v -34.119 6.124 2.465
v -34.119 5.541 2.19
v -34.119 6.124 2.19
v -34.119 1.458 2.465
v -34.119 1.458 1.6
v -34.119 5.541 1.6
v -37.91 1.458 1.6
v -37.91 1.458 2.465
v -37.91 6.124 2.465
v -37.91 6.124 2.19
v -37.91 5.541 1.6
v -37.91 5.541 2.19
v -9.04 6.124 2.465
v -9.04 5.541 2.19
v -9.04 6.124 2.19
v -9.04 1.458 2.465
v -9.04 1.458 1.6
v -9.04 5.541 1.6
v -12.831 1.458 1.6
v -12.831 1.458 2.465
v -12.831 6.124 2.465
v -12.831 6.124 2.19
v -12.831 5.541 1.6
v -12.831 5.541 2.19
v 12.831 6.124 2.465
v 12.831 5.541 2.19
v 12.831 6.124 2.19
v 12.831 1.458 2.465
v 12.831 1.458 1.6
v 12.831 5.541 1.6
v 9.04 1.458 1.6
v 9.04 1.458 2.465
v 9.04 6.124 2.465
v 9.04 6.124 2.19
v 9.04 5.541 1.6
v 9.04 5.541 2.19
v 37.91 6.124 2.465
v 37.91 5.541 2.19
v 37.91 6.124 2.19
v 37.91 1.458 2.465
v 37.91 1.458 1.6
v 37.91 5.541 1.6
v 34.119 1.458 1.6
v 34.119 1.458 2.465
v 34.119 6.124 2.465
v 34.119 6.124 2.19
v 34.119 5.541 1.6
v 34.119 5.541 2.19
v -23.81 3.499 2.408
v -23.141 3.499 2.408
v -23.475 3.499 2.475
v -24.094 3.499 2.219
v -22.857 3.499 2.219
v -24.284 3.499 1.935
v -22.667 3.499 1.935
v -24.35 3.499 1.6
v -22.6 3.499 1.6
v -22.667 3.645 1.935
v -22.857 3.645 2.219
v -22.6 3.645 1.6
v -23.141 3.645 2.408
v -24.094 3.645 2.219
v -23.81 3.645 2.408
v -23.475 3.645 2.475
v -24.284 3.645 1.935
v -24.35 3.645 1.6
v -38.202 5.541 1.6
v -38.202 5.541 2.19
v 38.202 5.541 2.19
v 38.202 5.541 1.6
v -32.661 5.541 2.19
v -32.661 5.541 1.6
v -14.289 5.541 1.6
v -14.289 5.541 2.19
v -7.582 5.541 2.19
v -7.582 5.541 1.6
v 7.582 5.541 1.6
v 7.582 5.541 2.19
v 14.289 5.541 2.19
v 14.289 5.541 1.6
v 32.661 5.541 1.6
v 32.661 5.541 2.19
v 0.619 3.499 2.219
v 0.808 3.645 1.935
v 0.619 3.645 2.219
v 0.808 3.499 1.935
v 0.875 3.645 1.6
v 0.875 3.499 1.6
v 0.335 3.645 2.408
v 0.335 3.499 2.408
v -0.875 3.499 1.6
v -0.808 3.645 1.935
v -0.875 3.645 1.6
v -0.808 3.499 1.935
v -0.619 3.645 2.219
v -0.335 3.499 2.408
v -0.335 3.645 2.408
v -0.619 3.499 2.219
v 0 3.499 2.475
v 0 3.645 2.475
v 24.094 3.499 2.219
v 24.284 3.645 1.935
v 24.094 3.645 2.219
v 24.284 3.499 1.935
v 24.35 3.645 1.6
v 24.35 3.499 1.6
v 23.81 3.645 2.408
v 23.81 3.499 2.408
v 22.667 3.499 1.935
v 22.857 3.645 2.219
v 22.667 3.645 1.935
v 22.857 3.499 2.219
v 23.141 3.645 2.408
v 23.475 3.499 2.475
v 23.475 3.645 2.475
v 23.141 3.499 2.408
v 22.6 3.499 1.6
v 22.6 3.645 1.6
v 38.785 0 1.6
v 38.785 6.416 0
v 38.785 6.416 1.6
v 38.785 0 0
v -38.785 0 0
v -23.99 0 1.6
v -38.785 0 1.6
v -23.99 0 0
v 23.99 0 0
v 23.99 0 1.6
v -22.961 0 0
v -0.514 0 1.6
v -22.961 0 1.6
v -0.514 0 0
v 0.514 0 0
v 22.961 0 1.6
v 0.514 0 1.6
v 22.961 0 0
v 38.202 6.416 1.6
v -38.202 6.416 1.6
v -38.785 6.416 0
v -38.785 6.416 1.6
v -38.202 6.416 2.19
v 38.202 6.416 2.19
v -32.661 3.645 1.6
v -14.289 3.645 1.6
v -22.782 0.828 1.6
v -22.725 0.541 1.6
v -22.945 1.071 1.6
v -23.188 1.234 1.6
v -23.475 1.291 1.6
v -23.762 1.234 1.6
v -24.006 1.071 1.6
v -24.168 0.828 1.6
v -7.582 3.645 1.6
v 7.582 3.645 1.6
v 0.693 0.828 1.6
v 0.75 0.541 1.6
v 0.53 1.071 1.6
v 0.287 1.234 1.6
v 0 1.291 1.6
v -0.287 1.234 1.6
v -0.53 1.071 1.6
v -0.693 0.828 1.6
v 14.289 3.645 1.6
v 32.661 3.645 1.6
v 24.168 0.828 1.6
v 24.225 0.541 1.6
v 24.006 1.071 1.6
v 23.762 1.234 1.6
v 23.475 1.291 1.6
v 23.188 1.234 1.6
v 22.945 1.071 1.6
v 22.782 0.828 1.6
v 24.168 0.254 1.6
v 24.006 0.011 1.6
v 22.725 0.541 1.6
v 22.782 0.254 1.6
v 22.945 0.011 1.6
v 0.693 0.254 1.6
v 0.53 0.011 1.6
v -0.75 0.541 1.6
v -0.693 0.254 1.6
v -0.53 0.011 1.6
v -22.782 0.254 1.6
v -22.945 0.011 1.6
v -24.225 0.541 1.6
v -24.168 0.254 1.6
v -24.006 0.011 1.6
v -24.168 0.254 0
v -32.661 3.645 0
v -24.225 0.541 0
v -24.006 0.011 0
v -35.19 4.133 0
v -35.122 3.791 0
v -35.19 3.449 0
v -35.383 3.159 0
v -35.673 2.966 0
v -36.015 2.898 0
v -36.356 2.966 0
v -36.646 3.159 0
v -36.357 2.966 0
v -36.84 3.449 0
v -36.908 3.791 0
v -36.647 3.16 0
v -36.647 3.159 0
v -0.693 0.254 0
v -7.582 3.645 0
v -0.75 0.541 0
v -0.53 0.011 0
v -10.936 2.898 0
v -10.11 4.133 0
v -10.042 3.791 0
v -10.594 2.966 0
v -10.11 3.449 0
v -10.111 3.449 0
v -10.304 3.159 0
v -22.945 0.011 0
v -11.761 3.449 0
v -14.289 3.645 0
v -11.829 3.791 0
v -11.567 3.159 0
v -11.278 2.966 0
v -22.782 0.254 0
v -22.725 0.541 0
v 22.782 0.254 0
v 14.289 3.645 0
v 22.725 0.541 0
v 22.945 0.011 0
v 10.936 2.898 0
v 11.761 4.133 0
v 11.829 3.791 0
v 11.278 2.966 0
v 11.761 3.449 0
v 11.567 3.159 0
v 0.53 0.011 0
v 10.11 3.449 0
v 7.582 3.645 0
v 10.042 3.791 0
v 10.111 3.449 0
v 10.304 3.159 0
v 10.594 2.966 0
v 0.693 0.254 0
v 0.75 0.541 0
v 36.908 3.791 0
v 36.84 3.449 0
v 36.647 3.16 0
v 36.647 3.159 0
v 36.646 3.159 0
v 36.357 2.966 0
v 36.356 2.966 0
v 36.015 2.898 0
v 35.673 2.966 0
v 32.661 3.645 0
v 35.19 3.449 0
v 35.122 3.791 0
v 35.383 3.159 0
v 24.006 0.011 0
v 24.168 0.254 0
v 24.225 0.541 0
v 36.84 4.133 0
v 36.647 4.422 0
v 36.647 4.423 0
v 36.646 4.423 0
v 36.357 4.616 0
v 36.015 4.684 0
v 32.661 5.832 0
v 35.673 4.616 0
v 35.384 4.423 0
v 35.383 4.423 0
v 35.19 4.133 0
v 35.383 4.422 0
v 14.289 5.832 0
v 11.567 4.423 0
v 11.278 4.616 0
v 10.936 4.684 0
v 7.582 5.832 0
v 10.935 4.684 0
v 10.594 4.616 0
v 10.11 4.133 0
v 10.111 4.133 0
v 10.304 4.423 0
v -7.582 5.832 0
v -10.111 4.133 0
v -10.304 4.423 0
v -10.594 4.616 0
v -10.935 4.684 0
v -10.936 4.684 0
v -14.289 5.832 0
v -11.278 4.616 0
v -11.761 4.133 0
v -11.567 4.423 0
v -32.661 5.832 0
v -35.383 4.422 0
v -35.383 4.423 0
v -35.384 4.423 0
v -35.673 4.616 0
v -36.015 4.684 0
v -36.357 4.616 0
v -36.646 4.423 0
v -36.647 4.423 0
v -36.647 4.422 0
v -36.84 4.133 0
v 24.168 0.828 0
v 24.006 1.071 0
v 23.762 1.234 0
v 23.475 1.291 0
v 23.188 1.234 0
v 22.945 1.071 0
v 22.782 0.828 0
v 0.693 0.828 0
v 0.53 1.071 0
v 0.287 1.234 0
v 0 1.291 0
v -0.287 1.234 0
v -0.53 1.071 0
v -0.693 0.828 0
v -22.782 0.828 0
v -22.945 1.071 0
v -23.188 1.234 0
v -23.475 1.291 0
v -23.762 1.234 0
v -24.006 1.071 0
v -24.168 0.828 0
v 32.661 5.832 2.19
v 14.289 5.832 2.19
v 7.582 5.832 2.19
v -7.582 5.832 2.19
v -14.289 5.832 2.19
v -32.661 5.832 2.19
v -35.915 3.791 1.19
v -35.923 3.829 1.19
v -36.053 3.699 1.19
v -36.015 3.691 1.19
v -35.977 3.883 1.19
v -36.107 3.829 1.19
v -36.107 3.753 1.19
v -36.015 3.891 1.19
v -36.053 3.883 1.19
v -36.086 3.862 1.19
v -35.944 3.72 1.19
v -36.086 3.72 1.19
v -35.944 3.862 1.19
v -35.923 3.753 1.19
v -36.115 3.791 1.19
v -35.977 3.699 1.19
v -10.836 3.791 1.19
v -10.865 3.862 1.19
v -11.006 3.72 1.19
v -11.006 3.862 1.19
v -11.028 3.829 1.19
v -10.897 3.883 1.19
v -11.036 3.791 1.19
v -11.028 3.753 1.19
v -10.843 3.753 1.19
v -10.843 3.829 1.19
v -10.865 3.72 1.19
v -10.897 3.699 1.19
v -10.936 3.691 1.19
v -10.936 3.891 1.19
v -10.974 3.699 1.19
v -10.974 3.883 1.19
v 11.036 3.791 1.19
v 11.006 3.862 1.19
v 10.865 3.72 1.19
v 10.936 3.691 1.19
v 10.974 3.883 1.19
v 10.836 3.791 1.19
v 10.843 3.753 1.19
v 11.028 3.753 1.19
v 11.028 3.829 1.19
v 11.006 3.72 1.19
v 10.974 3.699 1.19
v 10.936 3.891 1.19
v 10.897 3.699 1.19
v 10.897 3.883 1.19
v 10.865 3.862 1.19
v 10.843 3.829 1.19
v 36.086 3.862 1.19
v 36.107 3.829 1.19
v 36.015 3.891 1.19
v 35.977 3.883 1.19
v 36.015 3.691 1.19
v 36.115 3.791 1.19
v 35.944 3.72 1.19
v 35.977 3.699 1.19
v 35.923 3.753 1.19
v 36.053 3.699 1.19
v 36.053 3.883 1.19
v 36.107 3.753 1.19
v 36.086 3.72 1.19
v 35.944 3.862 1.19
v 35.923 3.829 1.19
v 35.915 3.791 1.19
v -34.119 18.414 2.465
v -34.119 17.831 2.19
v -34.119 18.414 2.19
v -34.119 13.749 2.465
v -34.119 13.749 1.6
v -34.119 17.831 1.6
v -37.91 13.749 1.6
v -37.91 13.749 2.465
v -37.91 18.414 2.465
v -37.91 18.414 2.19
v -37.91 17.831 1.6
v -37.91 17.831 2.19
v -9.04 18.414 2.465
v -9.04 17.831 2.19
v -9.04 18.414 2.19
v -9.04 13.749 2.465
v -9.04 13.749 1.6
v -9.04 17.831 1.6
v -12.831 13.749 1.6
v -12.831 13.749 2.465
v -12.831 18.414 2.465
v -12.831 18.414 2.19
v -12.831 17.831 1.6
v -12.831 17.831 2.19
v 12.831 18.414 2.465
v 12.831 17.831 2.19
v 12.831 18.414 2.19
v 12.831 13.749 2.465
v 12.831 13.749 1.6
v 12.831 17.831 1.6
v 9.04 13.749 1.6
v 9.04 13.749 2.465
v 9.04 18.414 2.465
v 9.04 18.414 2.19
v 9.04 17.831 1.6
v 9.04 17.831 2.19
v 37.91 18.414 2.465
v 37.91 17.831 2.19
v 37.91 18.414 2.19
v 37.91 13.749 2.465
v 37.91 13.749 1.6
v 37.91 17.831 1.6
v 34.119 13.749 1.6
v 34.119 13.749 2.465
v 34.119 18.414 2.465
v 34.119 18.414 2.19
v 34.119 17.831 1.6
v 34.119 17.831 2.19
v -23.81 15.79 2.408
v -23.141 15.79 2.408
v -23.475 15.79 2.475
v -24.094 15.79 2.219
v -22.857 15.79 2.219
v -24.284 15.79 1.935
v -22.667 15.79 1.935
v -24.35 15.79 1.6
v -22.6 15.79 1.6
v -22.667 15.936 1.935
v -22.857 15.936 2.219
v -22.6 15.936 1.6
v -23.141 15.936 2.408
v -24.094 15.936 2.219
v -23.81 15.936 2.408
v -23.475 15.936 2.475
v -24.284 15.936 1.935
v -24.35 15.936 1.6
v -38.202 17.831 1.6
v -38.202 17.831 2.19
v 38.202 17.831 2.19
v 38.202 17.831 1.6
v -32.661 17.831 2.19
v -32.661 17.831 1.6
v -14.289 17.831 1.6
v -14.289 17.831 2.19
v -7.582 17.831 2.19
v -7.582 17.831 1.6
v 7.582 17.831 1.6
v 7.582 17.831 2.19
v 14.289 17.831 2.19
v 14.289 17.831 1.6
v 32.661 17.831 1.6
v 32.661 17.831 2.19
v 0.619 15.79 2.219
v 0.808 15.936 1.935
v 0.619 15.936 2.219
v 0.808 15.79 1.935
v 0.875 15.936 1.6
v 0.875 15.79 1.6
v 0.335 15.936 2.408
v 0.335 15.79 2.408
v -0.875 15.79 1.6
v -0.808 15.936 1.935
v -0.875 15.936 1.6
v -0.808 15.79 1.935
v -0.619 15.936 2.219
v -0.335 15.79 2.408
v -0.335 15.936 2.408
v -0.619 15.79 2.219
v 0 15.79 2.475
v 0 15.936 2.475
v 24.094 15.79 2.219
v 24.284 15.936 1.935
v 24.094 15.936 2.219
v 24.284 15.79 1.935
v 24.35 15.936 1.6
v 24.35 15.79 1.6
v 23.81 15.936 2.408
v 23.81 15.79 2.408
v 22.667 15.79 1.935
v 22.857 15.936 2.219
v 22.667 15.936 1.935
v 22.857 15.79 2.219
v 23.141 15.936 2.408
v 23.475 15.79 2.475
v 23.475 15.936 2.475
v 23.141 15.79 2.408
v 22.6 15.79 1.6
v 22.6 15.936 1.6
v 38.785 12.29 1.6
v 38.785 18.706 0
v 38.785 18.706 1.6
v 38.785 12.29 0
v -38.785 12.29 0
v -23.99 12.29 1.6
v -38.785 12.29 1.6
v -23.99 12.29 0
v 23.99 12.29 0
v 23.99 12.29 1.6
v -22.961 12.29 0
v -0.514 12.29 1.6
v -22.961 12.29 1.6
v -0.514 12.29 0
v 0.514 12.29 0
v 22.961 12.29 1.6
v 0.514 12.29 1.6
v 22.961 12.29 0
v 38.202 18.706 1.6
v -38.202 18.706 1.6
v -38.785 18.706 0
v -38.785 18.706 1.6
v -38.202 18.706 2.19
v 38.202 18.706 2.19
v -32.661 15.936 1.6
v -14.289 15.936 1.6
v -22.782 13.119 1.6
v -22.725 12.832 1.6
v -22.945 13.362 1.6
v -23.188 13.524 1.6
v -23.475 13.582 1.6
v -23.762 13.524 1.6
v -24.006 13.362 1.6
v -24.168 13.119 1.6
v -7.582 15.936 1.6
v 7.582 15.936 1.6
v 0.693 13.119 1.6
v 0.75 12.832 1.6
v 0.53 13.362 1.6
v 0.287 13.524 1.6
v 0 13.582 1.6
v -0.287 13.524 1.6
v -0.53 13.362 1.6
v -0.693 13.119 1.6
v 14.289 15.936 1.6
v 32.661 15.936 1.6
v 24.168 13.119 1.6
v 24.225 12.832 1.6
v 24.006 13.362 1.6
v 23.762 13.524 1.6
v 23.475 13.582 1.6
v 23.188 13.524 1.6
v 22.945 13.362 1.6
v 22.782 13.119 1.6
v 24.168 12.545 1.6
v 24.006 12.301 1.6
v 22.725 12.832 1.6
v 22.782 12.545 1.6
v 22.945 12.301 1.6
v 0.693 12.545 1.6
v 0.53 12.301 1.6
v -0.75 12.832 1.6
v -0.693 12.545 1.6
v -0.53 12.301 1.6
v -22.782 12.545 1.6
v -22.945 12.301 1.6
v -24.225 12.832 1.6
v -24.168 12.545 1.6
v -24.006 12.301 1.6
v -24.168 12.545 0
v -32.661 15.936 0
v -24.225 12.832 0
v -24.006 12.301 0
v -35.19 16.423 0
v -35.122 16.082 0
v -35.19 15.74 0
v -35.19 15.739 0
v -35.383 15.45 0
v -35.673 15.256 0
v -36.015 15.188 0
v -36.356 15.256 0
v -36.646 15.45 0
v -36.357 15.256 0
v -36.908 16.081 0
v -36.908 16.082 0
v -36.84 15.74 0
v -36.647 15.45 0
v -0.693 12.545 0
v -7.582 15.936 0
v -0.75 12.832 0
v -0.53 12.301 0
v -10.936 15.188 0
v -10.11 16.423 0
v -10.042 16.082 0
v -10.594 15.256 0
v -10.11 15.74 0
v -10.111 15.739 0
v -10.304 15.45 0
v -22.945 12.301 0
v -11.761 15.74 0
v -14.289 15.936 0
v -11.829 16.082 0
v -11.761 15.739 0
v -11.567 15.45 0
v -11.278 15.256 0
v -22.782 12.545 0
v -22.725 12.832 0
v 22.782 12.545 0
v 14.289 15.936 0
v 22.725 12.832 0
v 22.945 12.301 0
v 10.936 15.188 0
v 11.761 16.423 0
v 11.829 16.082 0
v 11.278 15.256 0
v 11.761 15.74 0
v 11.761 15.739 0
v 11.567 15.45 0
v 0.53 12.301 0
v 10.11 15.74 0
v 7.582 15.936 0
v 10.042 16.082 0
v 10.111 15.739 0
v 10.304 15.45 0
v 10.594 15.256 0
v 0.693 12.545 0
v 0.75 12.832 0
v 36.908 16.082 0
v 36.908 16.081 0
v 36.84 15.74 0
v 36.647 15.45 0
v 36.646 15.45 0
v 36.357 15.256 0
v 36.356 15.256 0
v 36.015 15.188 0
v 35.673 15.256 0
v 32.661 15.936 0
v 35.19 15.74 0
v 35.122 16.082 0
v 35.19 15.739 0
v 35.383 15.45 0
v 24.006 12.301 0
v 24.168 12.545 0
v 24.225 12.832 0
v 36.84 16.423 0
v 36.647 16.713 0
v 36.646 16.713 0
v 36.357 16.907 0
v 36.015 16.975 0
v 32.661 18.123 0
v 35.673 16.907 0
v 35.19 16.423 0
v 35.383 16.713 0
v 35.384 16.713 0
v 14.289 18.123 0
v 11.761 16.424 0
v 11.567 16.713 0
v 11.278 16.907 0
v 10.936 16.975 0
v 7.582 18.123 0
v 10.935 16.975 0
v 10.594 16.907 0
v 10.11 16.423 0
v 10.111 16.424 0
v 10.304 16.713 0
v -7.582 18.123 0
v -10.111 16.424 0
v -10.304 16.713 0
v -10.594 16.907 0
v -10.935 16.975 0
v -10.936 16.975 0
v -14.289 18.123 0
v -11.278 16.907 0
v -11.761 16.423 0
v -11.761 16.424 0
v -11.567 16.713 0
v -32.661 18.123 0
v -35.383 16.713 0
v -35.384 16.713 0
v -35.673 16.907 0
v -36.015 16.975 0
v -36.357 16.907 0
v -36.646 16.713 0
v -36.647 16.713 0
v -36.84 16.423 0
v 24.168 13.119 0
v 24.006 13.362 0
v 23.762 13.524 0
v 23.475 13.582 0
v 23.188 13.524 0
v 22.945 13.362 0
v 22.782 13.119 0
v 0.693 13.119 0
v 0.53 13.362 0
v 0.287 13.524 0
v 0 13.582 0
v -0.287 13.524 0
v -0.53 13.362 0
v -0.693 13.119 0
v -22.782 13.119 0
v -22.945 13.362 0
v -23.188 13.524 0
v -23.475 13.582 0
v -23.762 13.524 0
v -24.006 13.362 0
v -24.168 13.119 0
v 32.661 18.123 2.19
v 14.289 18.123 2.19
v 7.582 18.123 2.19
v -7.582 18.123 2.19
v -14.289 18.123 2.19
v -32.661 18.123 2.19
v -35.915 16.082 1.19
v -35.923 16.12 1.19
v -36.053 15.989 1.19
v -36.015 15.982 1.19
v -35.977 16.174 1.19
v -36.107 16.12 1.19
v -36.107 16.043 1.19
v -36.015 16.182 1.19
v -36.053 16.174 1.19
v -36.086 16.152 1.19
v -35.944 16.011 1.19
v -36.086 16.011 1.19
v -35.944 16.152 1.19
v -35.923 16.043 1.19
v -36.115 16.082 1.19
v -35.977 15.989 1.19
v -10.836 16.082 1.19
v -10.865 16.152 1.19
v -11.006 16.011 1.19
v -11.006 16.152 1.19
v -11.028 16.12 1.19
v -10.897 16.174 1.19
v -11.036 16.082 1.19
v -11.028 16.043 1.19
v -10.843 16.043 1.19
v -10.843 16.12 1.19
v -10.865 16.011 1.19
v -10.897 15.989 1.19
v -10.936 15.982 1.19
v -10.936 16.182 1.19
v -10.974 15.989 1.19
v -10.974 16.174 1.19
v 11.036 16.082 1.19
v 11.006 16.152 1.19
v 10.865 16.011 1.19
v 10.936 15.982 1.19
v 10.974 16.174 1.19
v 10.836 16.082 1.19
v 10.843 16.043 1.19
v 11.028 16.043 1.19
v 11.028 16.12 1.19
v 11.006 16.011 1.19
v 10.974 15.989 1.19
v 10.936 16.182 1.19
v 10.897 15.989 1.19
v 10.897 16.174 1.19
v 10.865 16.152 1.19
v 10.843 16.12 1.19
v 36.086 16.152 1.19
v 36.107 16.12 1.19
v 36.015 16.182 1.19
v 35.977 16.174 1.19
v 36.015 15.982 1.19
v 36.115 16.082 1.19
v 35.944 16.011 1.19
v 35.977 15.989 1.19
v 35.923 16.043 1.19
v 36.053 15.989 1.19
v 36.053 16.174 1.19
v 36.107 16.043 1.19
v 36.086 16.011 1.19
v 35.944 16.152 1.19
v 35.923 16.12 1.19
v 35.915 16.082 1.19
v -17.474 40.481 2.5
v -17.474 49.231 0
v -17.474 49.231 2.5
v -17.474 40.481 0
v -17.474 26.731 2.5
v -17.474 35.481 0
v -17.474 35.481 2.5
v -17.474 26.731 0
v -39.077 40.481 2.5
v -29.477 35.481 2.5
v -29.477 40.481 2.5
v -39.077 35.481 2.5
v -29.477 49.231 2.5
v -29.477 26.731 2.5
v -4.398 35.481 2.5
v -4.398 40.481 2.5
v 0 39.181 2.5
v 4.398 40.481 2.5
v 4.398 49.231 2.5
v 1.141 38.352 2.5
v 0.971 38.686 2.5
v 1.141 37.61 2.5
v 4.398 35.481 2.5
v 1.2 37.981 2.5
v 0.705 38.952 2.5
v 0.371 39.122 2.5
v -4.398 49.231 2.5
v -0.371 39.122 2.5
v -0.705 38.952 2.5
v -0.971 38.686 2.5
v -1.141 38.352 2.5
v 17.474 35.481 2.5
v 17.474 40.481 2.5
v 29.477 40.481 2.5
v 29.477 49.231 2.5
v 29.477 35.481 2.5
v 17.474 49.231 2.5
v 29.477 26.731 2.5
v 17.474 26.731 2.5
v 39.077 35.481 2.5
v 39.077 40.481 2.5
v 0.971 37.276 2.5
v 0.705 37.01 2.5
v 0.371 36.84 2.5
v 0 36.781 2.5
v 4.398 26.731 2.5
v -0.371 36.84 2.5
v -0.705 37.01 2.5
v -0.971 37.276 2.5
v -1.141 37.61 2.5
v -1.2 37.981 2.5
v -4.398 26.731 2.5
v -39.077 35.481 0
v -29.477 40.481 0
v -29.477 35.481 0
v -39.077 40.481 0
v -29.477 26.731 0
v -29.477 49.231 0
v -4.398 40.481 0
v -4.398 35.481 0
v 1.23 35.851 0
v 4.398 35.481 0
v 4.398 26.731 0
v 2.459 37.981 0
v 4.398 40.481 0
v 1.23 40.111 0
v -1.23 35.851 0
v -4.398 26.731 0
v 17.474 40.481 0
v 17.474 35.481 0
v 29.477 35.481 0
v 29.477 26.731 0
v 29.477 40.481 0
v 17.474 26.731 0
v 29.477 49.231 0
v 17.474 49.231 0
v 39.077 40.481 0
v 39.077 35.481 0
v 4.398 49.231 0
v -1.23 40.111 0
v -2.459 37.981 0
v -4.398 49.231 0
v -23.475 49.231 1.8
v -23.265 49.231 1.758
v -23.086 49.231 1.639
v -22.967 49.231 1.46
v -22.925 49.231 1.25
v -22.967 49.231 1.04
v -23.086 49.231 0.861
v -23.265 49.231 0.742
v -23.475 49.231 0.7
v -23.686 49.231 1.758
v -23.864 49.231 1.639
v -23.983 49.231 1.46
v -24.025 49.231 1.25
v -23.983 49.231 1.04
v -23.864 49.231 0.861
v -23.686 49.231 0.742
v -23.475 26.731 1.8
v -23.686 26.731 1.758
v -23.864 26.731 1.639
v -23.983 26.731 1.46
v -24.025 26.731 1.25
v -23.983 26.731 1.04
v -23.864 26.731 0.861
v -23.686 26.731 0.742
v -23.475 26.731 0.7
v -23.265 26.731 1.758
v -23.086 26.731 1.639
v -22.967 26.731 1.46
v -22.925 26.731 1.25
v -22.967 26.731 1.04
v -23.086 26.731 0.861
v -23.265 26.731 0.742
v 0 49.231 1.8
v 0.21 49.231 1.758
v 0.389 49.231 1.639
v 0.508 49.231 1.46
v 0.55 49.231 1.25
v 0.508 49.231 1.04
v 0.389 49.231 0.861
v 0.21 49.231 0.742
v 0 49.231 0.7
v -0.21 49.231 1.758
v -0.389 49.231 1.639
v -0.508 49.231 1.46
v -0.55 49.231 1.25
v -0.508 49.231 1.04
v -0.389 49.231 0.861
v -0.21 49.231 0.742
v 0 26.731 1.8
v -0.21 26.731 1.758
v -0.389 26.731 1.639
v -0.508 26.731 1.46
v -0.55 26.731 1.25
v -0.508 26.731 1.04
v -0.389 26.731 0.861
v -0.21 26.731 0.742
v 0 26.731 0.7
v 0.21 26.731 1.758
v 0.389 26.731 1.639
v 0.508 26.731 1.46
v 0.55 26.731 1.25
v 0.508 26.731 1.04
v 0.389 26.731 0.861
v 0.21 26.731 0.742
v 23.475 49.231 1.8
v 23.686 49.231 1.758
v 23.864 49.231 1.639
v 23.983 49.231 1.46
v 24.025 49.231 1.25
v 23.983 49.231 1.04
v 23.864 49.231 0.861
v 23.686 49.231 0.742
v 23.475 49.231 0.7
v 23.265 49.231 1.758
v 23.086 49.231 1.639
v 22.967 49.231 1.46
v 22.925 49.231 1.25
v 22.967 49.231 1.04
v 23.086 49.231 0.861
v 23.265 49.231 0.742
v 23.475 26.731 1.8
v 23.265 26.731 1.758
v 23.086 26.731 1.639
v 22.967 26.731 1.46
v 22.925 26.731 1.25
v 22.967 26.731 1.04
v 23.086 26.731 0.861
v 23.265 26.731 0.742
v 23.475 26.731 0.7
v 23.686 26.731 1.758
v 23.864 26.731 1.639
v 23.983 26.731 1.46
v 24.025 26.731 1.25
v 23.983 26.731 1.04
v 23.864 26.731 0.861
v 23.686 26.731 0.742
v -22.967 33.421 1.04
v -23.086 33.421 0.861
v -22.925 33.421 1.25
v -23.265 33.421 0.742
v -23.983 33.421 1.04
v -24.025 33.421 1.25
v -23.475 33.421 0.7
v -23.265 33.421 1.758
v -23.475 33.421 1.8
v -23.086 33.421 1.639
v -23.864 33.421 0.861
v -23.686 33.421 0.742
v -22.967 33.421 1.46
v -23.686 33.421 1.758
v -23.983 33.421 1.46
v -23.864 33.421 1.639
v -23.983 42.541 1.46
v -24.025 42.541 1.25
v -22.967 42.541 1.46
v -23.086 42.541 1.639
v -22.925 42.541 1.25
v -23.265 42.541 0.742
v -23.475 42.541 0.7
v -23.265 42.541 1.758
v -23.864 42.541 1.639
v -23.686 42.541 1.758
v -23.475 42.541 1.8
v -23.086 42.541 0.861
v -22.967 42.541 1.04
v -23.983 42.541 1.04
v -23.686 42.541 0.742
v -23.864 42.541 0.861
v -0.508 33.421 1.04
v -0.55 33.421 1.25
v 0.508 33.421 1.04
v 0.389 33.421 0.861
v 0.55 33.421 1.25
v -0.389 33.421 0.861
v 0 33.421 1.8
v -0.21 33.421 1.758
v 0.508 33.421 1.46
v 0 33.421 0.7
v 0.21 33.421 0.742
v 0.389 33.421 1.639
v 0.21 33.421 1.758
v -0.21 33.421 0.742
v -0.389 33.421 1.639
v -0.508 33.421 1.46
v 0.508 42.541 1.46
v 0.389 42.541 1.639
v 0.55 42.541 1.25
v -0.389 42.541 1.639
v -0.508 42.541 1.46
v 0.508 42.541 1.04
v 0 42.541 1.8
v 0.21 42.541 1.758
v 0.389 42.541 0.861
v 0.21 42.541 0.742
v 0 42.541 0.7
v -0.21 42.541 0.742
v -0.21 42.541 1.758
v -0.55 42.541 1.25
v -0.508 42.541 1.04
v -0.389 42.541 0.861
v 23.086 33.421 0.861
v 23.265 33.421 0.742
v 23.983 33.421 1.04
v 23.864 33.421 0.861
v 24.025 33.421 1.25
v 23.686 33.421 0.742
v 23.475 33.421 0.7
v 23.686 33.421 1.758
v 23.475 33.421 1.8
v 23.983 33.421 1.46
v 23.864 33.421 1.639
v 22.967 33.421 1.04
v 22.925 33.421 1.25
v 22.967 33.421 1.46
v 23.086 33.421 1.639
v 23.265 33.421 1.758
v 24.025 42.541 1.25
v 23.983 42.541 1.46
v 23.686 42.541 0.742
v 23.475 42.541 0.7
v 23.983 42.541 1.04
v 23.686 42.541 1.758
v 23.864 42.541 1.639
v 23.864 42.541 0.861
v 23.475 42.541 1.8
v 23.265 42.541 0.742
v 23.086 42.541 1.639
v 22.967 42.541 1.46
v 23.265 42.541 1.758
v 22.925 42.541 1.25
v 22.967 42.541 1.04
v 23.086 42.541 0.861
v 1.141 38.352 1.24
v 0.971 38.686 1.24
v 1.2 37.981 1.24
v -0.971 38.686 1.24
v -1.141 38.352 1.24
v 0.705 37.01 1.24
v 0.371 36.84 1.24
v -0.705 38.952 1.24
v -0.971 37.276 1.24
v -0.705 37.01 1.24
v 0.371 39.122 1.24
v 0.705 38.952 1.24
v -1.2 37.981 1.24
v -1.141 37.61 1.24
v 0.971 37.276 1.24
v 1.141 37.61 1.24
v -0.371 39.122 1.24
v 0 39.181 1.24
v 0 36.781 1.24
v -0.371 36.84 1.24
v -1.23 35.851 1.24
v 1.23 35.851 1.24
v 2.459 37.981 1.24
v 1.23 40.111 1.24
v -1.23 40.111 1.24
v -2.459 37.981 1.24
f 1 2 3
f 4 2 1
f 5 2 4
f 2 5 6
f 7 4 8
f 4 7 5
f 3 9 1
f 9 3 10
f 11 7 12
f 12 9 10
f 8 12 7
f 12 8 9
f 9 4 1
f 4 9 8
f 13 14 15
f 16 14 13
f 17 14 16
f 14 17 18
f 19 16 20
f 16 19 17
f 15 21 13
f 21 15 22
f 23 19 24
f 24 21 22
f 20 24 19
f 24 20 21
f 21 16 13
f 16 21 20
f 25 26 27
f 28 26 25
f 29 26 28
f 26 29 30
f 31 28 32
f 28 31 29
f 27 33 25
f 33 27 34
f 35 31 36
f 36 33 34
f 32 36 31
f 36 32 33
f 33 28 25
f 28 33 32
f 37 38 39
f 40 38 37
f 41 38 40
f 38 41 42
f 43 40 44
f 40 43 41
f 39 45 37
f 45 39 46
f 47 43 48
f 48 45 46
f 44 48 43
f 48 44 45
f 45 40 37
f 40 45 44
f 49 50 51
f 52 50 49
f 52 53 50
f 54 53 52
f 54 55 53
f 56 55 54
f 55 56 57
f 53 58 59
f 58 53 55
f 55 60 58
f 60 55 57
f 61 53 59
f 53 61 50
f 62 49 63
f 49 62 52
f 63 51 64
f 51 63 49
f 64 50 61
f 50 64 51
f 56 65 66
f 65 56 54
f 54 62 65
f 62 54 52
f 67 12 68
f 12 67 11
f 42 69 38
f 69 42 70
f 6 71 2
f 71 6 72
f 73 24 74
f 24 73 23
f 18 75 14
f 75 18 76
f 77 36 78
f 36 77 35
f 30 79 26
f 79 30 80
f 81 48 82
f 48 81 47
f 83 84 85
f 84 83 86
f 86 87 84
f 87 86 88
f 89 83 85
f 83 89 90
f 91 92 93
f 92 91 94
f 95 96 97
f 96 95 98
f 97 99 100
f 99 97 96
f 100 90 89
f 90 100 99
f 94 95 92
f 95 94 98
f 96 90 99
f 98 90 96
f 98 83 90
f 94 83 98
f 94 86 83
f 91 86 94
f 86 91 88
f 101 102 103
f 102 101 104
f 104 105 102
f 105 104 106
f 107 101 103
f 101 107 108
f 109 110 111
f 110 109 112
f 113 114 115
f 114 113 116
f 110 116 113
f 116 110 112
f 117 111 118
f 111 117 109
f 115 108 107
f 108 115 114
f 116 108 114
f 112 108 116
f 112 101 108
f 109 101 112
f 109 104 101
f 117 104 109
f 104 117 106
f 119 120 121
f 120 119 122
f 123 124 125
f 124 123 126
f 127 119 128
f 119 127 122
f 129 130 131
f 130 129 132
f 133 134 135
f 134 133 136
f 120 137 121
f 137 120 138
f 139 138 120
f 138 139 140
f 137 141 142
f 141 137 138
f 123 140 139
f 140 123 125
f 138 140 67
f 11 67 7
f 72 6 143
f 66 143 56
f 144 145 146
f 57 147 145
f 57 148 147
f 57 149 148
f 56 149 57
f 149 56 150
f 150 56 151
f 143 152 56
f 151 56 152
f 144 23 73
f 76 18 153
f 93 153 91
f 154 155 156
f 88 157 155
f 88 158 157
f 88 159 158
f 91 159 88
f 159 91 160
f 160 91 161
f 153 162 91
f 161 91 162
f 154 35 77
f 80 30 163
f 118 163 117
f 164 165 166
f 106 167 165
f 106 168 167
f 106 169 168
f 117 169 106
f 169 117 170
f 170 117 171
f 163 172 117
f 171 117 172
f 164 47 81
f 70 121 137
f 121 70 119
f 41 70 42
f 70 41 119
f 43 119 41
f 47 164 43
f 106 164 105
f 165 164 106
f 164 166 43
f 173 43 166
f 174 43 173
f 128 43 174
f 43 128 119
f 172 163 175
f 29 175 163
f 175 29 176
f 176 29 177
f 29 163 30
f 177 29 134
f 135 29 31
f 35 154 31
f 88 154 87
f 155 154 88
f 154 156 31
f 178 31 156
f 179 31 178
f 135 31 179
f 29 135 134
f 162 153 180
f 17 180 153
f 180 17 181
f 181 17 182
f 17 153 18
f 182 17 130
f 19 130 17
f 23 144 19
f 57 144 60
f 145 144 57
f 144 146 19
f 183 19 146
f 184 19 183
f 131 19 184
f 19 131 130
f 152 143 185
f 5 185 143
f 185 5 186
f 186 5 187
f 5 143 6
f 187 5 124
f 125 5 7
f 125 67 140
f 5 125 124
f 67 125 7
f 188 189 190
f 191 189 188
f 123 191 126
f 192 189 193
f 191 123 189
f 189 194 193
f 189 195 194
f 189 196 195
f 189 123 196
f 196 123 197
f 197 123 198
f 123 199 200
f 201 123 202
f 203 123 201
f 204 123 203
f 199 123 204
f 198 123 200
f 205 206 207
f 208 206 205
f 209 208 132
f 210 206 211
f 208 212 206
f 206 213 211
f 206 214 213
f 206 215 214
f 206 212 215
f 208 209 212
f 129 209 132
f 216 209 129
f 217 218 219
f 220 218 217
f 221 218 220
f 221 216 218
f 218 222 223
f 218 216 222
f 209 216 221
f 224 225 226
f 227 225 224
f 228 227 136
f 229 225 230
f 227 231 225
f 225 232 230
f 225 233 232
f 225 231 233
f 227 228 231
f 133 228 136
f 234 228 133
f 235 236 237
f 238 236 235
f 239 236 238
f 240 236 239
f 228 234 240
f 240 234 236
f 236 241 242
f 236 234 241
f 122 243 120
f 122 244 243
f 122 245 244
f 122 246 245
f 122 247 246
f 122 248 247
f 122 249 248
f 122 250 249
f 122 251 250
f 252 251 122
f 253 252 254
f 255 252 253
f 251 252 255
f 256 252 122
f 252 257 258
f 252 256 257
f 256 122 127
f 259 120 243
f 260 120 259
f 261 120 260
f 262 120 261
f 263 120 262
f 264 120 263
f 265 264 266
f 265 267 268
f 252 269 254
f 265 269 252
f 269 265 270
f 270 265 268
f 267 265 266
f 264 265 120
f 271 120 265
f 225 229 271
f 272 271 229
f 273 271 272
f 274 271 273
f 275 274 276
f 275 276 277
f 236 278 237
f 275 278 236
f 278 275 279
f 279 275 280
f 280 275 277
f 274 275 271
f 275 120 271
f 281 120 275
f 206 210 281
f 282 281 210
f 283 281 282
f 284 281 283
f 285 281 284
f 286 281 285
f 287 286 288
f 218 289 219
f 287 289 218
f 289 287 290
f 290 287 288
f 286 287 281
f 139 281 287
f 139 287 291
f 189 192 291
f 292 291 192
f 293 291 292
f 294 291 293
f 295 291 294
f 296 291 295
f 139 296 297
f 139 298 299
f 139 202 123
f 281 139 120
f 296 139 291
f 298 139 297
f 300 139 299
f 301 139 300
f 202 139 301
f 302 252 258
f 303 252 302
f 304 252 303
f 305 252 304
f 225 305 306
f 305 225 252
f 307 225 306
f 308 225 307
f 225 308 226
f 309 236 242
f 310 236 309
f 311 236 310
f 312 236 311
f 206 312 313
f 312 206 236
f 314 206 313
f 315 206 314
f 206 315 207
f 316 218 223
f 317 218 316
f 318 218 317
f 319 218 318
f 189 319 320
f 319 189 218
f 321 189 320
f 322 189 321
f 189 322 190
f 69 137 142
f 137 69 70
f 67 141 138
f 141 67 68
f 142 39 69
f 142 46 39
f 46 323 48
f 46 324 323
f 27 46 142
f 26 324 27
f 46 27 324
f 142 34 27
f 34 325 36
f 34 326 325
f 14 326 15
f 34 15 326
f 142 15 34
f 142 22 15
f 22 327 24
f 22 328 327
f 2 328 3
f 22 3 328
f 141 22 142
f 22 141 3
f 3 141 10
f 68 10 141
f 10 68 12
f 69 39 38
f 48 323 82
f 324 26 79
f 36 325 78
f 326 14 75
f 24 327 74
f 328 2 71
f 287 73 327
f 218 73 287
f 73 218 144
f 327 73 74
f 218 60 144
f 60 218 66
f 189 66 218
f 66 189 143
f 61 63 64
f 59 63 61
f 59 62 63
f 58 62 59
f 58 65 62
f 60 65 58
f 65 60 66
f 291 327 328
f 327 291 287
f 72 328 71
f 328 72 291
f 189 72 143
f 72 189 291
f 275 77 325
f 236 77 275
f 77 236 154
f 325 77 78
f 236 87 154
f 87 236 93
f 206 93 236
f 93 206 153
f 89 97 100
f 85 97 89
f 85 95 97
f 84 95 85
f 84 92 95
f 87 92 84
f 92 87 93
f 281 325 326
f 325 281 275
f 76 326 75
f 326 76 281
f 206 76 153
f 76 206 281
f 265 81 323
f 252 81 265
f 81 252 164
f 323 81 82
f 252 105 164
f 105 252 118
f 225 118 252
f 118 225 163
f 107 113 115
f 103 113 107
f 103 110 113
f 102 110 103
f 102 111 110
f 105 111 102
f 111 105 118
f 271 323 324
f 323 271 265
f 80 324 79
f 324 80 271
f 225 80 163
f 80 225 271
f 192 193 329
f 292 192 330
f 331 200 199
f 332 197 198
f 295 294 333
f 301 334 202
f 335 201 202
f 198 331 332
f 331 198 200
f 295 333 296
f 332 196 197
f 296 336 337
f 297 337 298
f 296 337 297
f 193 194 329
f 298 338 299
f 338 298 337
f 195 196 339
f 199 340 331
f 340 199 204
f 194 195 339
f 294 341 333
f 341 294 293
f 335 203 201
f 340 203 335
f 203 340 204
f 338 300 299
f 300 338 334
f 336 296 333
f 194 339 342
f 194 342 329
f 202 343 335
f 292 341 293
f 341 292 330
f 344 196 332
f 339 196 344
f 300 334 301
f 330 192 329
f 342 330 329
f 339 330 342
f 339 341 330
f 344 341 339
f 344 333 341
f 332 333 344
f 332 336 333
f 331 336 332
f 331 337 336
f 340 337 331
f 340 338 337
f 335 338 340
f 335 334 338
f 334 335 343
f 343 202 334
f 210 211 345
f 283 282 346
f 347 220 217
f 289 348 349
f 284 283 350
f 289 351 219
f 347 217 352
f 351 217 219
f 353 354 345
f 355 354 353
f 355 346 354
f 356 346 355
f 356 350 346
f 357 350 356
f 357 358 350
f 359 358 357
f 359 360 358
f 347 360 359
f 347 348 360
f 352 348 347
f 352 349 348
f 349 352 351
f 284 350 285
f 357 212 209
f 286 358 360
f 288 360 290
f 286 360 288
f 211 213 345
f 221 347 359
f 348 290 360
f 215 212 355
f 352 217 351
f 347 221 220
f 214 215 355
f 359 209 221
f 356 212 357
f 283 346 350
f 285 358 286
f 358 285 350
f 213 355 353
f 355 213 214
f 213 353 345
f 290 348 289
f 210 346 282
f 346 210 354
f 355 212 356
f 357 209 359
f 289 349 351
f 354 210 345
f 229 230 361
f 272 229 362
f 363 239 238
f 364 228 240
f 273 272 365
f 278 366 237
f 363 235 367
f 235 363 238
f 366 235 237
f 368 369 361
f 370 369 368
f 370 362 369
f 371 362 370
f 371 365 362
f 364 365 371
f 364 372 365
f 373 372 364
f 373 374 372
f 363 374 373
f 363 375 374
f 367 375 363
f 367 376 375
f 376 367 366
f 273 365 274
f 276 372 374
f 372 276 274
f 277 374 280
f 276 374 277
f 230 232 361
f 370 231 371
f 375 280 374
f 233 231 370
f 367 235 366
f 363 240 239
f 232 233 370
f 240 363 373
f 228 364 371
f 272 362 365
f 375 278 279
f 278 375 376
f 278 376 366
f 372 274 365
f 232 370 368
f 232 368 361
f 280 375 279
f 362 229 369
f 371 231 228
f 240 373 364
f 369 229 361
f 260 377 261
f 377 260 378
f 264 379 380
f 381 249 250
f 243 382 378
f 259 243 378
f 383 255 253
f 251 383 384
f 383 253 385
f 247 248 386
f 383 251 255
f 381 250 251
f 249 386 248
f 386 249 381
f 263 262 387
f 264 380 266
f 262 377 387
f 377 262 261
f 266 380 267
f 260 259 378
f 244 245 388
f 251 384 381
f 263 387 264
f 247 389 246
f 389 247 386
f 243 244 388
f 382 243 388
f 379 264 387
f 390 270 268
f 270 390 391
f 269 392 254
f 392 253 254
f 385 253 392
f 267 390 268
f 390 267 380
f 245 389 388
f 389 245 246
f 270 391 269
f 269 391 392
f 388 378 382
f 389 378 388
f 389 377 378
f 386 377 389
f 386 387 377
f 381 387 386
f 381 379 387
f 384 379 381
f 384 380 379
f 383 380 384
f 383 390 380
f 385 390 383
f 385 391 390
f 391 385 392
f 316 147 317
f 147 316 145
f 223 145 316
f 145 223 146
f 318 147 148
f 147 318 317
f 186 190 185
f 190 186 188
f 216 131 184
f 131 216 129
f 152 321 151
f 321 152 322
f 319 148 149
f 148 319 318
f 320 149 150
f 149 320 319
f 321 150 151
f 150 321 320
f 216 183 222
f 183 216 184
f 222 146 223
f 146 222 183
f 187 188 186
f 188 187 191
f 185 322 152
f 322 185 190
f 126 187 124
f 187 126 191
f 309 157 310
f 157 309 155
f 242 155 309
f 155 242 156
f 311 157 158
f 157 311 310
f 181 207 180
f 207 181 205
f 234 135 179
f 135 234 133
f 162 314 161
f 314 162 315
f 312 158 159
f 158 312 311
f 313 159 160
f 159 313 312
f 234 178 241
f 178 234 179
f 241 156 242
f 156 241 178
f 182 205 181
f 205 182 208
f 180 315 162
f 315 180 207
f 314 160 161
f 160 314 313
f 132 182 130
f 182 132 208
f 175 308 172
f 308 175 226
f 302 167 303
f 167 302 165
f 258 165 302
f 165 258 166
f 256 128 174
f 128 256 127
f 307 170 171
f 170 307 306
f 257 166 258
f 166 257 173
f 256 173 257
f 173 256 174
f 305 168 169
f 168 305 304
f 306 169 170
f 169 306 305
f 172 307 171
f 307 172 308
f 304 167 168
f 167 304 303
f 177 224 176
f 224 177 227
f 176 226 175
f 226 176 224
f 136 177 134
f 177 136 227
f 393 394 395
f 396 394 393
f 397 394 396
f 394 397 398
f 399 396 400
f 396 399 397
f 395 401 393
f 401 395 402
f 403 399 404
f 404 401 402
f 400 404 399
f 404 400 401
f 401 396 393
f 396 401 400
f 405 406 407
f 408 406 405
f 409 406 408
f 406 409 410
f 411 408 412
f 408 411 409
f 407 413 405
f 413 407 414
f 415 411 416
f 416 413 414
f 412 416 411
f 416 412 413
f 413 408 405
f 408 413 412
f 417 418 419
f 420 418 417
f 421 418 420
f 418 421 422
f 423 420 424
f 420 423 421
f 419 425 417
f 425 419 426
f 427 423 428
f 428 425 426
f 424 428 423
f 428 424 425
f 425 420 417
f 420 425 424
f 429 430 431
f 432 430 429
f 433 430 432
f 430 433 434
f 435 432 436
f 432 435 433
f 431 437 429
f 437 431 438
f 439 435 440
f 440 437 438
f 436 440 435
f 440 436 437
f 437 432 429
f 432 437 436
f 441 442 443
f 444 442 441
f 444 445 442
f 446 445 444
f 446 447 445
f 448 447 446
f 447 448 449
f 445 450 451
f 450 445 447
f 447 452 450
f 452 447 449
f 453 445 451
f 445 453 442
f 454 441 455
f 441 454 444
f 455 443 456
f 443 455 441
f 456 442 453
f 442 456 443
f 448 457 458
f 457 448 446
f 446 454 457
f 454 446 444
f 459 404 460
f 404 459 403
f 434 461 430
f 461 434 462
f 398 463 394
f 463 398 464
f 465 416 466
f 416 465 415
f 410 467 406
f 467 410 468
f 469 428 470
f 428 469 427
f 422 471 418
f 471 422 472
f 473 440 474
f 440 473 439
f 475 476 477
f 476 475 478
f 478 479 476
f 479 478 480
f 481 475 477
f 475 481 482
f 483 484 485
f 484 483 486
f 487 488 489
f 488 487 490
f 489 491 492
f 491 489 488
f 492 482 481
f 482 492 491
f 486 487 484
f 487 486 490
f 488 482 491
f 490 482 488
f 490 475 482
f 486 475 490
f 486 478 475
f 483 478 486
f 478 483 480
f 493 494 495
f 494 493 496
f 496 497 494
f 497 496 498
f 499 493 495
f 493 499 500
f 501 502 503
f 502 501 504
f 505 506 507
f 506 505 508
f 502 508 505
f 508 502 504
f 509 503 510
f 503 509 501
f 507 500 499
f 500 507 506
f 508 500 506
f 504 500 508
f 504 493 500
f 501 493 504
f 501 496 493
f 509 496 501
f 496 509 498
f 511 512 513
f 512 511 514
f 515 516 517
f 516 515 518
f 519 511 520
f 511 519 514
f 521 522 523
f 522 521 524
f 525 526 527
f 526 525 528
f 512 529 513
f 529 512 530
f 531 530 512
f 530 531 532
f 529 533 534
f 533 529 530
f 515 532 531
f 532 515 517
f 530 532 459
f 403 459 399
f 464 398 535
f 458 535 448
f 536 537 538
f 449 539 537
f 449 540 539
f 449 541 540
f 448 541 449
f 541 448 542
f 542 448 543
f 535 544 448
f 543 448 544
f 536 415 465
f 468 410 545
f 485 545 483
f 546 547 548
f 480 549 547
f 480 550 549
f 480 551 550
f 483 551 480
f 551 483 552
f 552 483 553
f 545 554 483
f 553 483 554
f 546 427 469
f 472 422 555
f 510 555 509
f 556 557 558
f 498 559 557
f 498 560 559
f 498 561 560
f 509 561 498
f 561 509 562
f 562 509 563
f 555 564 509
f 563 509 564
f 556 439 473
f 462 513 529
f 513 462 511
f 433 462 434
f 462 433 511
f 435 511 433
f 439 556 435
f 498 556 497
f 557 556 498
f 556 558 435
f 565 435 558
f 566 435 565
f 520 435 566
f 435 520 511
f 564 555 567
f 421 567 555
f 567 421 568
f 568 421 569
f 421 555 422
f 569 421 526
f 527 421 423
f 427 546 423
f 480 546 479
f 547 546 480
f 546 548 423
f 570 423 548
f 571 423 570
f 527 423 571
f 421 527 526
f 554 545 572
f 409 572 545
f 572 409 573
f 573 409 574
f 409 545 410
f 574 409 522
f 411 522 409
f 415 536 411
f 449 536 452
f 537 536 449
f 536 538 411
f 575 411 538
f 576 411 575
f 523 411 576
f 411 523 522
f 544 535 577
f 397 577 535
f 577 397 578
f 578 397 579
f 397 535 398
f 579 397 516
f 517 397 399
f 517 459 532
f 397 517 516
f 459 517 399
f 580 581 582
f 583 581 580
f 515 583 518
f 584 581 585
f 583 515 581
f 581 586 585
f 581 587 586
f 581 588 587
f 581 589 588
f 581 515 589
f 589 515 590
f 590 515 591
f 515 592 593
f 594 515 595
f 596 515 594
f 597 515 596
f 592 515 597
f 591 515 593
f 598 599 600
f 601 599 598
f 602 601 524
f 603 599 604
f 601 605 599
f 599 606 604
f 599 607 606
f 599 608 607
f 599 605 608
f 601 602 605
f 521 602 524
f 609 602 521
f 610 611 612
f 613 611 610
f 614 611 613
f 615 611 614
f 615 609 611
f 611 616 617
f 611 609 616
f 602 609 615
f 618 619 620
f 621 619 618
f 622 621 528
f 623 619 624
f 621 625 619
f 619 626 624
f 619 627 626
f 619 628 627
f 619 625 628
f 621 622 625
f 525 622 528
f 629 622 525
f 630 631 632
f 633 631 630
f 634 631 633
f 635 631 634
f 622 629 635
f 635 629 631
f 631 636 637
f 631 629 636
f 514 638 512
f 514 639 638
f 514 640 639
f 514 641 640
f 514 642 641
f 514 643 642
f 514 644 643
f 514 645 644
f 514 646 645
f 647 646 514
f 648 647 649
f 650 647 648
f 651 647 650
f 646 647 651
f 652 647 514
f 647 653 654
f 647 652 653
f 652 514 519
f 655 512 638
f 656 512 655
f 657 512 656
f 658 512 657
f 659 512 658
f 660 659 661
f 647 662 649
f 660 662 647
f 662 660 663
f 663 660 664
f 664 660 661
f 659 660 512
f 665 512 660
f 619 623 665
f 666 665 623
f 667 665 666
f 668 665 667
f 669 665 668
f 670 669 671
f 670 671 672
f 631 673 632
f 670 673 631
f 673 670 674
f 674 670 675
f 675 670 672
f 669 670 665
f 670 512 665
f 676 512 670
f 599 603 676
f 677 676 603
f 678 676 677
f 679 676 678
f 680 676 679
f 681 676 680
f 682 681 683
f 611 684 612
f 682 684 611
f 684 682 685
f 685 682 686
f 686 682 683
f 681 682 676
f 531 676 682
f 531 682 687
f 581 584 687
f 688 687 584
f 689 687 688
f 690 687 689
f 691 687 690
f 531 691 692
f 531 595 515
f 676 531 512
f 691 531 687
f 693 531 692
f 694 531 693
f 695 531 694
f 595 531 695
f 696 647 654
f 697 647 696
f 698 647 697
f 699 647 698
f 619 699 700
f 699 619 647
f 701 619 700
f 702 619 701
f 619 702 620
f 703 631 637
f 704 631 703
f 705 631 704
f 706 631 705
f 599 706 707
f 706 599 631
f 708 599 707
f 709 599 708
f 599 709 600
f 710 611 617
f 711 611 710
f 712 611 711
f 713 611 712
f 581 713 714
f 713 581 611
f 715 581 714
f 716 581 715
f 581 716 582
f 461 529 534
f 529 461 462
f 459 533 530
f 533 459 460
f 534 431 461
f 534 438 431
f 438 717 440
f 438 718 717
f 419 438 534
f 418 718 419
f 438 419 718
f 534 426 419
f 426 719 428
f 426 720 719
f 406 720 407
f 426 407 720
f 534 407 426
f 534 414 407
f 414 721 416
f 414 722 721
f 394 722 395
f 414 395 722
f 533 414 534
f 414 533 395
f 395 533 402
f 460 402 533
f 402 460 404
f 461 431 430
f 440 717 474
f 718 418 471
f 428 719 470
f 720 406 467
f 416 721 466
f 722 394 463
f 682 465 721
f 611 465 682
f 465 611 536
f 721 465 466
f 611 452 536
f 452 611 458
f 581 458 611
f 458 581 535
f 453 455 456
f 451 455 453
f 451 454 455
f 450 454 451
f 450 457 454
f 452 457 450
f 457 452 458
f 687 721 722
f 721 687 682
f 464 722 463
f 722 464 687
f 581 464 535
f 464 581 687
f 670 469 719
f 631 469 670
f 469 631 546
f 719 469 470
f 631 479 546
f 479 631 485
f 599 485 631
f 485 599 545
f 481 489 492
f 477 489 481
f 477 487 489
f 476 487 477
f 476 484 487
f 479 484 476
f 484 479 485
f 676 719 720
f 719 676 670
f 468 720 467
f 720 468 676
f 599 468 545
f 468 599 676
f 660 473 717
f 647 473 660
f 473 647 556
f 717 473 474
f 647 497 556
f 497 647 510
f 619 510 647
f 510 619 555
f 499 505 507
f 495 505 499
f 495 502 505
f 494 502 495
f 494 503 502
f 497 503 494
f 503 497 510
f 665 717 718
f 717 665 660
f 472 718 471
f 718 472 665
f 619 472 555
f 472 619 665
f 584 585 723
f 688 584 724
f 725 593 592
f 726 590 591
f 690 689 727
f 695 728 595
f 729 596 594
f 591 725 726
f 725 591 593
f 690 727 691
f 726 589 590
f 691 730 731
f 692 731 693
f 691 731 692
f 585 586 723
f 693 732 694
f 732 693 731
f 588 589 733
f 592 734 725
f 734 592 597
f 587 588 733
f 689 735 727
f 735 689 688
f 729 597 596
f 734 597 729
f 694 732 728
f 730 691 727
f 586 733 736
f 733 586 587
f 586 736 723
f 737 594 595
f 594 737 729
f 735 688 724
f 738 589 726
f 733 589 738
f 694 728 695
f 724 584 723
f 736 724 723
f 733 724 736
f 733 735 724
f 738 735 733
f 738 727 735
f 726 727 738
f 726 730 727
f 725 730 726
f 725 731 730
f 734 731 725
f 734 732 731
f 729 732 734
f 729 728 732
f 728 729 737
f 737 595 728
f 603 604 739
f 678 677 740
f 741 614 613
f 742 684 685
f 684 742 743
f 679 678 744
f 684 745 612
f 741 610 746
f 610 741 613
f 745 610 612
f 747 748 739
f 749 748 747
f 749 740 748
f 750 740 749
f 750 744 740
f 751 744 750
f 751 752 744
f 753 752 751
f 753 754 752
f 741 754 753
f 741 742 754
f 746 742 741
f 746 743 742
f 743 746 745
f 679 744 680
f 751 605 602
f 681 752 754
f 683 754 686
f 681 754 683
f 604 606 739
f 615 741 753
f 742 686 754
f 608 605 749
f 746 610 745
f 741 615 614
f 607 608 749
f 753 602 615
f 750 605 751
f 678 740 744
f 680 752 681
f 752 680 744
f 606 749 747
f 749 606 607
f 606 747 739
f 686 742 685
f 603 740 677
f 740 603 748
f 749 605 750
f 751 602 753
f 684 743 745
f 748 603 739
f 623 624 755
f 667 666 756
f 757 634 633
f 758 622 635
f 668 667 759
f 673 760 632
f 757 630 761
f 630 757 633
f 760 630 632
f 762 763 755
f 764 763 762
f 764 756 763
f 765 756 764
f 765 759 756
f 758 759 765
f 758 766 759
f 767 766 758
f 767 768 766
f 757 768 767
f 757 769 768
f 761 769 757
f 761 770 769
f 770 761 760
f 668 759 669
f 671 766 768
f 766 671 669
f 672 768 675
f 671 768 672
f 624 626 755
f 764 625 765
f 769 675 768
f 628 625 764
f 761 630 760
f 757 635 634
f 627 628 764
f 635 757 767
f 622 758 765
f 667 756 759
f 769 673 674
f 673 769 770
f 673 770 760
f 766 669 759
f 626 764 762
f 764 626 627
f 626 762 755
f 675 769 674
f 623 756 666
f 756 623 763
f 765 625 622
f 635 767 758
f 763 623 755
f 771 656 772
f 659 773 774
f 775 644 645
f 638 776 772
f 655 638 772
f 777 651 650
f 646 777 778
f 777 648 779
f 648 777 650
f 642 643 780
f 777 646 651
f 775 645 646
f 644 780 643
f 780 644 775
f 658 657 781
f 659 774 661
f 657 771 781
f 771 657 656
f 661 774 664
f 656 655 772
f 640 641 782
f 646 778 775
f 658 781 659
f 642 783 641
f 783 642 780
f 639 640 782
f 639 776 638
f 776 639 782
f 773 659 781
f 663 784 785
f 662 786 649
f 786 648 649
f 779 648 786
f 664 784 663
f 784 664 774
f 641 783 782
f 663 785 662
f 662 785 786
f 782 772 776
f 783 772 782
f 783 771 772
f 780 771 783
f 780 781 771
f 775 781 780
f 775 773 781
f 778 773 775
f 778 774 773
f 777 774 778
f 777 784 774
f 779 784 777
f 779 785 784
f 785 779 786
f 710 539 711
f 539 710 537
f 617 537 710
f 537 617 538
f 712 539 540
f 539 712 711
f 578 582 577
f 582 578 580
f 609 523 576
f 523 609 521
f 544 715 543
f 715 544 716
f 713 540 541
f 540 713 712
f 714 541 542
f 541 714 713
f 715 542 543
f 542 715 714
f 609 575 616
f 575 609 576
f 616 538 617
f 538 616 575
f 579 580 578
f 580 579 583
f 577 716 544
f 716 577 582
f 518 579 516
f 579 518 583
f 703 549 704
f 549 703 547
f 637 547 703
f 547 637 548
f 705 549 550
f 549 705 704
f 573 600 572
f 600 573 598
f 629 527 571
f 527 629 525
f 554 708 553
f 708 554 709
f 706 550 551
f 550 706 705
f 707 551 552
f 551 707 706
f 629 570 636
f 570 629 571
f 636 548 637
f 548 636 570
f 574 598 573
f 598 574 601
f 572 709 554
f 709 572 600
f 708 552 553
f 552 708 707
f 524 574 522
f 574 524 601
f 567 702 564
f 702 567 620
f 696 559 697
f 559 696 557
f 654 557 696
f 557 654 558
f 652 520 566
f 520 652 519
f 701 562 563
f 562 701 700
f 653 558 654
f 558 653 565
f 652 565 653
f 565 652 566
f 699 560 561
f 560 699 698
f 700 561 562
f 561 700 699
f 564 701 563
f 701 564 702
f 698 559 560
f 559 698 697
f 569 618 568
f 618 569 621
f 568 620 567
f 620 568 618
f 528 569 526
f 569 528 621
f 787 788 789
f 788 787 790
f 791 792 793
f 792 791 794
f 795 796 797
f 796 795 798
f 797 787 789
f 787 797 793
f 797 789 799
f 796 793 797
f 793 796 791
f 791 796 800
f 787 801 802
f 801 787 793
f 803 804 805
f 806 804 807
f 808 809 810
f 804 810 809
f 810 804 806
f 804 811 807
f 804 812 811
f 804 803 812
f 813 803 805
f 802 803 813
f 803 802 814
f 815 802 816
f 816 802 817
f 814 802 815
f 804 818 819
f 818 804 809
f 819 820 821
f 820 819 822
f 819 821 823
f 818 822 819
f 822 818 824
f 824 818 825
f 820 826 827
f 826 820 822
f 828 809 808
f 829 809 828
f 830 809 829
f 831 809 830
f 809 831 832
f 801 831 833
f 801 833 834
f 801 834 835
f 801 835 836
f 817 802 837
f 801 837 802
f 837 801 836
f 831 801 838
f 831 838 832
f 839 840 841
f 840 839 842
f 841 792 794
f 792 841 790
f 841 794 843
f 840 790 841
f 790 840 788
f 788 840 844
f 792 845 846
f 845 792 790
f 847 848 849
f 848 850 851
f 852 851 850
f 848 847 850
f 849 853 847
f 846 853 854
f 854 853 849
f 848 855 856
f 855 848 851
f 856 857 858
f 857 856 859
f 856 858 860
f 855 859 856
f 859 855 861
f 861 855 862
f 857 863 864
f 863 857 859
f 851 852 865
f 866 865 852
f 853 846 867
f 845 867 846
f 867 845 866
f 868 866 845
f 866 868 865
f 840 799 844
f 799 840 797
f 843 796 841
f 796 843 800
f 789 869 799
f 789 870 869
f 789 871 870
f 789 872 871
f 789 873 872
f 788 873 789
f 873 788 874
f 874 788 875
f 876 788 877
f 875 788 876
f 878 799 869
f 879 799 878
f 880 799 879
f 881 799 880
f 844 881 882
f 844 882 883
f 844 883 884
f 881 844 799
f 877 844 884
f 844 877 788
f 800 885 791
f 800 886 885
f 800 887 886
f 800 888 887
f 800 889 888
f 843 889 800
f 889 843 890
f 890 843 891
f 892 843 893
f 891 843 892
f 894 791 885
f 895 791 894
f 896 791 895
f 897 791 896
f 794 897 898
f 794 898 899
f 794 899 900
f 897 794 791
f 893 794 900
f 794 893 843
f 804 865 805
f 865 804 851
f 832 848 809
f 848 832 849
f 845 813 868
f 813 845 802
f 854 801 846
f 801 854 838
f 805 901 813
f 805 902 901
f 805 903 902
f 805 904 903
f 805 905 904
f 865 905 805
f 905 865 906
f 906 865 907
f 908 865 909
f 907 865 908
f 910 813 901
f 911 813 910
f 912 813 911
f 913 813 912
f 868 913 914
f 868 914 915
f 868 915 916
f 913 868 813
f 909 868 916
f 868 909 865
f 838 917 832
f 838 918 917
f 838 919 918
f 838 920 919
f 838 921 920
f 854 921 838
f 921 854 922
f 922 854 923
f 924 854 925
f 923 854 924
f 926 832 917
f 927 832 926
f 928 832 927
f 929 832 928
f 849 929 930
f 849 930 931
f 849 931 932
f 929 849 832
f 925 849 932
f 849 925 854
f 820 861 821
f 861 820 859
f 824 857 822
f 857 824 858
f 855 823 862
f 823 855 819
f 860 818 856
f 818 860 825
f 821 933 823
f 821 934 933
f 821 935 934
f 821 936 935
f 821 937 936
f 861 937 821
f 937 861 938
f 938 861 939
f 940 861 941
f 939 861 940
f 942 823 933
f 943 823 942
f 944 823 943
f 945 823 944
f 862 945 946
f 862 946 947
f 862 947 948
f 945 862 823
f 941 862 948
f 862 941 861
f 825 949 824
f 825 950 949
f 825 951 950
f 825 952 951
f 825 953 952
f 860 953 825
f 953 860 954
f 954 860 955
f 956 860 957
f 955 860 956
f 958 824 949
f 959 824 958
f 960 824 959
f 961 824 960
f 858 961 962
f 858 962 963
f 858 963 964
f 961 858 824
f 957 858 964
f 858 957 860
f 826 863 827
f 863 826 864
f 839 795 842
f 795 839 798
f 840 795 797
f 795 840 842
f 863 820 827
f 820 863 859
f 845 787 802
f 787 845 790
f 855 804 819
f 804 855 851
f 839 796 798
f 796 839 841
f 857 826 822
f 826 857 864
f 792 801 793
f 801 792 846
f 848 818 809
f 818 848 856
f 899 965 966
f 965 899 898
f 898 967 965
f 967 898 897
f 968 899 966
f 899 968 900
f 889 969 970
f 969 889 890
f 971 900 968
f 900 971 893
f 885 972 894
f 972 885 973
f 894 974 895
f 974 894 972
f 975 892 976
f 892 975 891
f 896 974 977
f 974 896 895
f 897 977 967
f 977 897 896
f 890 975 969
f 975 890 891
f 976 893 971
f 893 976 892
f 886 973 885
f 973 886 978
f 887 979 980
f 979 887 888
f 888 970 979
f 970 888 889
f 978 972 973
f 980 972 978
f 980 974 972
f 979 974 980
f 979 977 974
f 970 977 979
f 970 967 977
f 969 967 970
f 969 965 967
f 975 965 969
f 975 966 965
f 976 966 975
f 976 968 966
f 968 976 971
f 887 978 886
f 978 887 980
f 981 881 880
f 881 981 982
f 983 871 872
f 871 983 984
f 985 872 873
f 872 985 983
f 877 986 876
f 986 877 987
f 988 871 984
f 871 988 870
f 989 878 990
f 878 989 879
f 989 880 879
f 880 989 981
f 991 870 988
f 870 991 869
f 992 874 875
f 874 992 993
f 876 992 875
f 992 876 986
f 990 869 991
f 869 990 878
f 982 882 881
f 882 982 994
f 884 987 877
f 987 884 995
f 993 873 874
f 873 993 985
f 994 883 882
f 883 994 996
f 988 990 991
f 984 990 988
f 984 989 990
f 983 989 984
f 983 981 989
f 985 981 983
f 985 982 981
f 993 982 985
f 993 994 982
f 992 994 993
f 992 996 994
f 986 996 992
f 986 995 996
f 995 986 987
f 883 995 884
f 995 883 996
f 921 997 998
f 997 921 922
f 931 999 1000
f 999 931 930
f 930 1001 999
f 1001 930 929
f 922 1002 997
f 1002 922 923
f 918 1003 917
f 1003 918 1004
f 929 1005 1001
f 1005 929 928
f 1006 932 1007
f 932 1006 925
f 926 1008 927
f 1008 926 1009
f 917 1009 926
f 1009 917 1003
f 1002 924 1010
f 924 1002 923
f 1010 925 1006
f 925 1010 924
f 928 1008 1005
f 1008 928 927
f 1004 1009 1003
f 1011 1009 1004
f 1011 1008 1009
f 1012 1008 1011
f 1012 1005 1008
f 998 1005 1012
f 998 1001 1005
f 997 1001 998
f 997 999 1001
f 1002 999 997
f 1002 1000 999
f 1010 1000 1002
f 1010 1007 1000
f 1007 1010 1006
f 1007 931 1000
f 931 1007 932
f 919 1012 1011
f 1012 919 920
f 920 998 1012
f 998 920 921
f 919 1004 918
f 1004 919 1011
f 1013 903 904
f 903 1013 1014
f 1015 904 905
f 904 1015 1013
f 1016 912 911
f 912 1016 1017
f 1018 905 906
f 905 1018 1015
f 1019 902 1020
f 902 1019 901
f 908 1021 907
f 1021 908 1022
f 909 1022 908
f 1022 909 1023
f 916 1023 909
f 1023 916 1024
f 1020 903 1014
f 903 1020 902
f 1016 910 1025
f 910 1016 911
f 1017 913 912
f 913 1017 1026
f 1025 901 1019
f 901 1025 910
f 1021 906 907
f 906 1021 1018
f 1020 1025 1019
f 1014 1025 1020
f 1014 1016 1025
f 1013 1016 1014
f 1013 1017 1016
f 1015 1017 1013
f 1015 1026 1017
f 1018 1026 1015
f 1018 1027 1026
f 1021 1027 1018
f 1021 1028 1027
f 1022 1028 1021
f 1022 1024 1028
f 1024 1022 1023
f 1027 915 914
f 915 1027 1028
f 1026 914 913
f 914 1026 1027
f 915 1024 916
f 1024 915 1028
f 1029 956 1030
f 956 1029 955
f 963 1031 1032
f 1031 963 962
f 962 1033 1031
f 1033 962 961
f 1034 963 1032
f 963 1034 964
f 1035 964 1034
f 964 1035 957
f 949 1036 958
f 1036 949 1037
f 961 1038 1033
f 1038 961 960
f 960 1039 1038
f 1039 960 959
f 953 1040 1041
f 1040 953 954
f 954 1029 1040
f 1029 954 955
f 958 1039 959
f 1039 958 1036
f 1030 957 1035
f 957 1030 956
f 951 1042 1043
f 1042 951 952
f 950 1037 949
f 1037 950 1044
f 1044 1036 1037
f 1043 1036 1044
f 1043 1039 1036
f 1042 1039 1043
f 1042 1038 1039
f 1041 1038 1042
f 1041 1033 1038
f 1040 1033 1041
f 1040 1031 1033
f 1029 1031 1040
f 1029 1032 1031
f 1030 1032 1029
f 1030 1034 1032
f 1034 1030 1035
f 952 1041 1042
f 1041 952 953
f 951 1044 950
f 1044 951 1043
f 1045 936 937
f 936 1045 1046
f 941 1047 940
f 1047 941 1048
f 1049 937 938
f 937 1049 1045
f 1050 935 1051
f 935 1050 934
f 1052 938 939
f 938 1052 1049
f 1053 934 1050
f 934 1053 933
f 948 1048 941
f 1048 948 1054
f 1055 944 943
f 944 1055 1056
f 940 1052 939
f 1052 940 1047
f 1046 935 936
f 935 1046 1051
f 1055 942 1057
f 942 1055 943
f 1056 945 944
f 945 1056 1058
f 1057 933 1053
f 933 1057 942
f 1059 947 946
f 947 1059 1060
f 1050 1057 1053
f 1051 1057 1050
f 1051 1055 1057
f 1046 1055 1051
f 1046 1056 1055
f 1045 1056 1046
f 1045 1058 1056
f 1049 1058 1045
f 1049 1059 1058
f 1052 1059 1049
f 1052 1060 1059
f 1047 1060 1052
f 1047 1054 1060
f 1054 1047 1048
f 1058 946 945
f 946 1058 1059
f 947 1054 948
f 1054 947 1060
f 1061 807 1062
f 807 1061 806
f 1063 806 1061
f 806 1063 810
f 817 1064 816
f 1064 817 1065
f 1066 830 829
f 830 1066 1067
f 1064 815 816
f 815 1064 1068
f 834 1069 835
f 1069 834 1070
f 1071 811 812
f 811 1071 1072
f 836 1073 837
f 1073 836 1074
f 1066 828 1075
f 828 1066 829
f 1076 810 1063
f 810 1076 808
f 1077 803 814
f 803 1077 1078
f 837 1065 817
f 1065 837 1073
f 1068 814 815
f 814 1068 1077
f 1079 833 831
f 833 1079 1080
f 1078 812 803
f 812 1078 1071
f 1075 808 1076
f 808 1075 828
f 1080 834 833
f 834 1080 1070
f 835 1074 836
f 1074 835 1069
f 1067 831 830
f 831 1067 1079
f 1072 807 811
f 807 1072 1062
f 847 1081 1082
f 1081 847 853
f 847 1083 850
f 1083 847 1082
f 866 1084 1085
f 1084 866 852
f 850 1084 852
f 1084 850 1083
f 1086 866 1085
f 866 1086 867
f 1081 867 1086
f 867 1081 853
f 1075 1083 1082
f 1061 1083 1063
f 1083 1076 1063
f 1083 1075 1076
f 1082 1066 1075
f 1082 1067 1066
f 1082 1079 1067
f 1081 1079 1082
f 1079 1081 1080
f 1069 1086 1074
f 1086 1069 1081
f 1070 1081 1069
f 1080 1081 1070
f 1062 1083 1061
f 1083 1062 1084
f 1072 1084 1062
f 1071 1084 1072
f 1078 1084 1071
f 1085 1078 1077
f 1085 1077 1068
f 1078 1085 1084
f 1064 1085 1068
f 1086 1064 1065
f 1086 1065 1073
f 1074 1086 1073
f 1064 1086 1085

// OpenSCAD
// Milwaukee Road Little Joe, HO scale 1-87 - print 10 of 11: truck_drive - 4-axle driving truck: 2 sideframes + H frame - print 2
// Render (F6), export STL, print. Settings: ../../library/lj_params.scad
// Whole loco preview and notes: ../../MILW_LittleJoe_Main.scad
SCALE_SEL = "HO";
LOCO_SEL = "E70";   // [E20, E21, E70, E71, E72, E73, E74, E75, E76, E77, E78, E79] the body and roof change for E20 / E21
include <../../library/lj_all.scad>
lj_plate("truck_drive");
